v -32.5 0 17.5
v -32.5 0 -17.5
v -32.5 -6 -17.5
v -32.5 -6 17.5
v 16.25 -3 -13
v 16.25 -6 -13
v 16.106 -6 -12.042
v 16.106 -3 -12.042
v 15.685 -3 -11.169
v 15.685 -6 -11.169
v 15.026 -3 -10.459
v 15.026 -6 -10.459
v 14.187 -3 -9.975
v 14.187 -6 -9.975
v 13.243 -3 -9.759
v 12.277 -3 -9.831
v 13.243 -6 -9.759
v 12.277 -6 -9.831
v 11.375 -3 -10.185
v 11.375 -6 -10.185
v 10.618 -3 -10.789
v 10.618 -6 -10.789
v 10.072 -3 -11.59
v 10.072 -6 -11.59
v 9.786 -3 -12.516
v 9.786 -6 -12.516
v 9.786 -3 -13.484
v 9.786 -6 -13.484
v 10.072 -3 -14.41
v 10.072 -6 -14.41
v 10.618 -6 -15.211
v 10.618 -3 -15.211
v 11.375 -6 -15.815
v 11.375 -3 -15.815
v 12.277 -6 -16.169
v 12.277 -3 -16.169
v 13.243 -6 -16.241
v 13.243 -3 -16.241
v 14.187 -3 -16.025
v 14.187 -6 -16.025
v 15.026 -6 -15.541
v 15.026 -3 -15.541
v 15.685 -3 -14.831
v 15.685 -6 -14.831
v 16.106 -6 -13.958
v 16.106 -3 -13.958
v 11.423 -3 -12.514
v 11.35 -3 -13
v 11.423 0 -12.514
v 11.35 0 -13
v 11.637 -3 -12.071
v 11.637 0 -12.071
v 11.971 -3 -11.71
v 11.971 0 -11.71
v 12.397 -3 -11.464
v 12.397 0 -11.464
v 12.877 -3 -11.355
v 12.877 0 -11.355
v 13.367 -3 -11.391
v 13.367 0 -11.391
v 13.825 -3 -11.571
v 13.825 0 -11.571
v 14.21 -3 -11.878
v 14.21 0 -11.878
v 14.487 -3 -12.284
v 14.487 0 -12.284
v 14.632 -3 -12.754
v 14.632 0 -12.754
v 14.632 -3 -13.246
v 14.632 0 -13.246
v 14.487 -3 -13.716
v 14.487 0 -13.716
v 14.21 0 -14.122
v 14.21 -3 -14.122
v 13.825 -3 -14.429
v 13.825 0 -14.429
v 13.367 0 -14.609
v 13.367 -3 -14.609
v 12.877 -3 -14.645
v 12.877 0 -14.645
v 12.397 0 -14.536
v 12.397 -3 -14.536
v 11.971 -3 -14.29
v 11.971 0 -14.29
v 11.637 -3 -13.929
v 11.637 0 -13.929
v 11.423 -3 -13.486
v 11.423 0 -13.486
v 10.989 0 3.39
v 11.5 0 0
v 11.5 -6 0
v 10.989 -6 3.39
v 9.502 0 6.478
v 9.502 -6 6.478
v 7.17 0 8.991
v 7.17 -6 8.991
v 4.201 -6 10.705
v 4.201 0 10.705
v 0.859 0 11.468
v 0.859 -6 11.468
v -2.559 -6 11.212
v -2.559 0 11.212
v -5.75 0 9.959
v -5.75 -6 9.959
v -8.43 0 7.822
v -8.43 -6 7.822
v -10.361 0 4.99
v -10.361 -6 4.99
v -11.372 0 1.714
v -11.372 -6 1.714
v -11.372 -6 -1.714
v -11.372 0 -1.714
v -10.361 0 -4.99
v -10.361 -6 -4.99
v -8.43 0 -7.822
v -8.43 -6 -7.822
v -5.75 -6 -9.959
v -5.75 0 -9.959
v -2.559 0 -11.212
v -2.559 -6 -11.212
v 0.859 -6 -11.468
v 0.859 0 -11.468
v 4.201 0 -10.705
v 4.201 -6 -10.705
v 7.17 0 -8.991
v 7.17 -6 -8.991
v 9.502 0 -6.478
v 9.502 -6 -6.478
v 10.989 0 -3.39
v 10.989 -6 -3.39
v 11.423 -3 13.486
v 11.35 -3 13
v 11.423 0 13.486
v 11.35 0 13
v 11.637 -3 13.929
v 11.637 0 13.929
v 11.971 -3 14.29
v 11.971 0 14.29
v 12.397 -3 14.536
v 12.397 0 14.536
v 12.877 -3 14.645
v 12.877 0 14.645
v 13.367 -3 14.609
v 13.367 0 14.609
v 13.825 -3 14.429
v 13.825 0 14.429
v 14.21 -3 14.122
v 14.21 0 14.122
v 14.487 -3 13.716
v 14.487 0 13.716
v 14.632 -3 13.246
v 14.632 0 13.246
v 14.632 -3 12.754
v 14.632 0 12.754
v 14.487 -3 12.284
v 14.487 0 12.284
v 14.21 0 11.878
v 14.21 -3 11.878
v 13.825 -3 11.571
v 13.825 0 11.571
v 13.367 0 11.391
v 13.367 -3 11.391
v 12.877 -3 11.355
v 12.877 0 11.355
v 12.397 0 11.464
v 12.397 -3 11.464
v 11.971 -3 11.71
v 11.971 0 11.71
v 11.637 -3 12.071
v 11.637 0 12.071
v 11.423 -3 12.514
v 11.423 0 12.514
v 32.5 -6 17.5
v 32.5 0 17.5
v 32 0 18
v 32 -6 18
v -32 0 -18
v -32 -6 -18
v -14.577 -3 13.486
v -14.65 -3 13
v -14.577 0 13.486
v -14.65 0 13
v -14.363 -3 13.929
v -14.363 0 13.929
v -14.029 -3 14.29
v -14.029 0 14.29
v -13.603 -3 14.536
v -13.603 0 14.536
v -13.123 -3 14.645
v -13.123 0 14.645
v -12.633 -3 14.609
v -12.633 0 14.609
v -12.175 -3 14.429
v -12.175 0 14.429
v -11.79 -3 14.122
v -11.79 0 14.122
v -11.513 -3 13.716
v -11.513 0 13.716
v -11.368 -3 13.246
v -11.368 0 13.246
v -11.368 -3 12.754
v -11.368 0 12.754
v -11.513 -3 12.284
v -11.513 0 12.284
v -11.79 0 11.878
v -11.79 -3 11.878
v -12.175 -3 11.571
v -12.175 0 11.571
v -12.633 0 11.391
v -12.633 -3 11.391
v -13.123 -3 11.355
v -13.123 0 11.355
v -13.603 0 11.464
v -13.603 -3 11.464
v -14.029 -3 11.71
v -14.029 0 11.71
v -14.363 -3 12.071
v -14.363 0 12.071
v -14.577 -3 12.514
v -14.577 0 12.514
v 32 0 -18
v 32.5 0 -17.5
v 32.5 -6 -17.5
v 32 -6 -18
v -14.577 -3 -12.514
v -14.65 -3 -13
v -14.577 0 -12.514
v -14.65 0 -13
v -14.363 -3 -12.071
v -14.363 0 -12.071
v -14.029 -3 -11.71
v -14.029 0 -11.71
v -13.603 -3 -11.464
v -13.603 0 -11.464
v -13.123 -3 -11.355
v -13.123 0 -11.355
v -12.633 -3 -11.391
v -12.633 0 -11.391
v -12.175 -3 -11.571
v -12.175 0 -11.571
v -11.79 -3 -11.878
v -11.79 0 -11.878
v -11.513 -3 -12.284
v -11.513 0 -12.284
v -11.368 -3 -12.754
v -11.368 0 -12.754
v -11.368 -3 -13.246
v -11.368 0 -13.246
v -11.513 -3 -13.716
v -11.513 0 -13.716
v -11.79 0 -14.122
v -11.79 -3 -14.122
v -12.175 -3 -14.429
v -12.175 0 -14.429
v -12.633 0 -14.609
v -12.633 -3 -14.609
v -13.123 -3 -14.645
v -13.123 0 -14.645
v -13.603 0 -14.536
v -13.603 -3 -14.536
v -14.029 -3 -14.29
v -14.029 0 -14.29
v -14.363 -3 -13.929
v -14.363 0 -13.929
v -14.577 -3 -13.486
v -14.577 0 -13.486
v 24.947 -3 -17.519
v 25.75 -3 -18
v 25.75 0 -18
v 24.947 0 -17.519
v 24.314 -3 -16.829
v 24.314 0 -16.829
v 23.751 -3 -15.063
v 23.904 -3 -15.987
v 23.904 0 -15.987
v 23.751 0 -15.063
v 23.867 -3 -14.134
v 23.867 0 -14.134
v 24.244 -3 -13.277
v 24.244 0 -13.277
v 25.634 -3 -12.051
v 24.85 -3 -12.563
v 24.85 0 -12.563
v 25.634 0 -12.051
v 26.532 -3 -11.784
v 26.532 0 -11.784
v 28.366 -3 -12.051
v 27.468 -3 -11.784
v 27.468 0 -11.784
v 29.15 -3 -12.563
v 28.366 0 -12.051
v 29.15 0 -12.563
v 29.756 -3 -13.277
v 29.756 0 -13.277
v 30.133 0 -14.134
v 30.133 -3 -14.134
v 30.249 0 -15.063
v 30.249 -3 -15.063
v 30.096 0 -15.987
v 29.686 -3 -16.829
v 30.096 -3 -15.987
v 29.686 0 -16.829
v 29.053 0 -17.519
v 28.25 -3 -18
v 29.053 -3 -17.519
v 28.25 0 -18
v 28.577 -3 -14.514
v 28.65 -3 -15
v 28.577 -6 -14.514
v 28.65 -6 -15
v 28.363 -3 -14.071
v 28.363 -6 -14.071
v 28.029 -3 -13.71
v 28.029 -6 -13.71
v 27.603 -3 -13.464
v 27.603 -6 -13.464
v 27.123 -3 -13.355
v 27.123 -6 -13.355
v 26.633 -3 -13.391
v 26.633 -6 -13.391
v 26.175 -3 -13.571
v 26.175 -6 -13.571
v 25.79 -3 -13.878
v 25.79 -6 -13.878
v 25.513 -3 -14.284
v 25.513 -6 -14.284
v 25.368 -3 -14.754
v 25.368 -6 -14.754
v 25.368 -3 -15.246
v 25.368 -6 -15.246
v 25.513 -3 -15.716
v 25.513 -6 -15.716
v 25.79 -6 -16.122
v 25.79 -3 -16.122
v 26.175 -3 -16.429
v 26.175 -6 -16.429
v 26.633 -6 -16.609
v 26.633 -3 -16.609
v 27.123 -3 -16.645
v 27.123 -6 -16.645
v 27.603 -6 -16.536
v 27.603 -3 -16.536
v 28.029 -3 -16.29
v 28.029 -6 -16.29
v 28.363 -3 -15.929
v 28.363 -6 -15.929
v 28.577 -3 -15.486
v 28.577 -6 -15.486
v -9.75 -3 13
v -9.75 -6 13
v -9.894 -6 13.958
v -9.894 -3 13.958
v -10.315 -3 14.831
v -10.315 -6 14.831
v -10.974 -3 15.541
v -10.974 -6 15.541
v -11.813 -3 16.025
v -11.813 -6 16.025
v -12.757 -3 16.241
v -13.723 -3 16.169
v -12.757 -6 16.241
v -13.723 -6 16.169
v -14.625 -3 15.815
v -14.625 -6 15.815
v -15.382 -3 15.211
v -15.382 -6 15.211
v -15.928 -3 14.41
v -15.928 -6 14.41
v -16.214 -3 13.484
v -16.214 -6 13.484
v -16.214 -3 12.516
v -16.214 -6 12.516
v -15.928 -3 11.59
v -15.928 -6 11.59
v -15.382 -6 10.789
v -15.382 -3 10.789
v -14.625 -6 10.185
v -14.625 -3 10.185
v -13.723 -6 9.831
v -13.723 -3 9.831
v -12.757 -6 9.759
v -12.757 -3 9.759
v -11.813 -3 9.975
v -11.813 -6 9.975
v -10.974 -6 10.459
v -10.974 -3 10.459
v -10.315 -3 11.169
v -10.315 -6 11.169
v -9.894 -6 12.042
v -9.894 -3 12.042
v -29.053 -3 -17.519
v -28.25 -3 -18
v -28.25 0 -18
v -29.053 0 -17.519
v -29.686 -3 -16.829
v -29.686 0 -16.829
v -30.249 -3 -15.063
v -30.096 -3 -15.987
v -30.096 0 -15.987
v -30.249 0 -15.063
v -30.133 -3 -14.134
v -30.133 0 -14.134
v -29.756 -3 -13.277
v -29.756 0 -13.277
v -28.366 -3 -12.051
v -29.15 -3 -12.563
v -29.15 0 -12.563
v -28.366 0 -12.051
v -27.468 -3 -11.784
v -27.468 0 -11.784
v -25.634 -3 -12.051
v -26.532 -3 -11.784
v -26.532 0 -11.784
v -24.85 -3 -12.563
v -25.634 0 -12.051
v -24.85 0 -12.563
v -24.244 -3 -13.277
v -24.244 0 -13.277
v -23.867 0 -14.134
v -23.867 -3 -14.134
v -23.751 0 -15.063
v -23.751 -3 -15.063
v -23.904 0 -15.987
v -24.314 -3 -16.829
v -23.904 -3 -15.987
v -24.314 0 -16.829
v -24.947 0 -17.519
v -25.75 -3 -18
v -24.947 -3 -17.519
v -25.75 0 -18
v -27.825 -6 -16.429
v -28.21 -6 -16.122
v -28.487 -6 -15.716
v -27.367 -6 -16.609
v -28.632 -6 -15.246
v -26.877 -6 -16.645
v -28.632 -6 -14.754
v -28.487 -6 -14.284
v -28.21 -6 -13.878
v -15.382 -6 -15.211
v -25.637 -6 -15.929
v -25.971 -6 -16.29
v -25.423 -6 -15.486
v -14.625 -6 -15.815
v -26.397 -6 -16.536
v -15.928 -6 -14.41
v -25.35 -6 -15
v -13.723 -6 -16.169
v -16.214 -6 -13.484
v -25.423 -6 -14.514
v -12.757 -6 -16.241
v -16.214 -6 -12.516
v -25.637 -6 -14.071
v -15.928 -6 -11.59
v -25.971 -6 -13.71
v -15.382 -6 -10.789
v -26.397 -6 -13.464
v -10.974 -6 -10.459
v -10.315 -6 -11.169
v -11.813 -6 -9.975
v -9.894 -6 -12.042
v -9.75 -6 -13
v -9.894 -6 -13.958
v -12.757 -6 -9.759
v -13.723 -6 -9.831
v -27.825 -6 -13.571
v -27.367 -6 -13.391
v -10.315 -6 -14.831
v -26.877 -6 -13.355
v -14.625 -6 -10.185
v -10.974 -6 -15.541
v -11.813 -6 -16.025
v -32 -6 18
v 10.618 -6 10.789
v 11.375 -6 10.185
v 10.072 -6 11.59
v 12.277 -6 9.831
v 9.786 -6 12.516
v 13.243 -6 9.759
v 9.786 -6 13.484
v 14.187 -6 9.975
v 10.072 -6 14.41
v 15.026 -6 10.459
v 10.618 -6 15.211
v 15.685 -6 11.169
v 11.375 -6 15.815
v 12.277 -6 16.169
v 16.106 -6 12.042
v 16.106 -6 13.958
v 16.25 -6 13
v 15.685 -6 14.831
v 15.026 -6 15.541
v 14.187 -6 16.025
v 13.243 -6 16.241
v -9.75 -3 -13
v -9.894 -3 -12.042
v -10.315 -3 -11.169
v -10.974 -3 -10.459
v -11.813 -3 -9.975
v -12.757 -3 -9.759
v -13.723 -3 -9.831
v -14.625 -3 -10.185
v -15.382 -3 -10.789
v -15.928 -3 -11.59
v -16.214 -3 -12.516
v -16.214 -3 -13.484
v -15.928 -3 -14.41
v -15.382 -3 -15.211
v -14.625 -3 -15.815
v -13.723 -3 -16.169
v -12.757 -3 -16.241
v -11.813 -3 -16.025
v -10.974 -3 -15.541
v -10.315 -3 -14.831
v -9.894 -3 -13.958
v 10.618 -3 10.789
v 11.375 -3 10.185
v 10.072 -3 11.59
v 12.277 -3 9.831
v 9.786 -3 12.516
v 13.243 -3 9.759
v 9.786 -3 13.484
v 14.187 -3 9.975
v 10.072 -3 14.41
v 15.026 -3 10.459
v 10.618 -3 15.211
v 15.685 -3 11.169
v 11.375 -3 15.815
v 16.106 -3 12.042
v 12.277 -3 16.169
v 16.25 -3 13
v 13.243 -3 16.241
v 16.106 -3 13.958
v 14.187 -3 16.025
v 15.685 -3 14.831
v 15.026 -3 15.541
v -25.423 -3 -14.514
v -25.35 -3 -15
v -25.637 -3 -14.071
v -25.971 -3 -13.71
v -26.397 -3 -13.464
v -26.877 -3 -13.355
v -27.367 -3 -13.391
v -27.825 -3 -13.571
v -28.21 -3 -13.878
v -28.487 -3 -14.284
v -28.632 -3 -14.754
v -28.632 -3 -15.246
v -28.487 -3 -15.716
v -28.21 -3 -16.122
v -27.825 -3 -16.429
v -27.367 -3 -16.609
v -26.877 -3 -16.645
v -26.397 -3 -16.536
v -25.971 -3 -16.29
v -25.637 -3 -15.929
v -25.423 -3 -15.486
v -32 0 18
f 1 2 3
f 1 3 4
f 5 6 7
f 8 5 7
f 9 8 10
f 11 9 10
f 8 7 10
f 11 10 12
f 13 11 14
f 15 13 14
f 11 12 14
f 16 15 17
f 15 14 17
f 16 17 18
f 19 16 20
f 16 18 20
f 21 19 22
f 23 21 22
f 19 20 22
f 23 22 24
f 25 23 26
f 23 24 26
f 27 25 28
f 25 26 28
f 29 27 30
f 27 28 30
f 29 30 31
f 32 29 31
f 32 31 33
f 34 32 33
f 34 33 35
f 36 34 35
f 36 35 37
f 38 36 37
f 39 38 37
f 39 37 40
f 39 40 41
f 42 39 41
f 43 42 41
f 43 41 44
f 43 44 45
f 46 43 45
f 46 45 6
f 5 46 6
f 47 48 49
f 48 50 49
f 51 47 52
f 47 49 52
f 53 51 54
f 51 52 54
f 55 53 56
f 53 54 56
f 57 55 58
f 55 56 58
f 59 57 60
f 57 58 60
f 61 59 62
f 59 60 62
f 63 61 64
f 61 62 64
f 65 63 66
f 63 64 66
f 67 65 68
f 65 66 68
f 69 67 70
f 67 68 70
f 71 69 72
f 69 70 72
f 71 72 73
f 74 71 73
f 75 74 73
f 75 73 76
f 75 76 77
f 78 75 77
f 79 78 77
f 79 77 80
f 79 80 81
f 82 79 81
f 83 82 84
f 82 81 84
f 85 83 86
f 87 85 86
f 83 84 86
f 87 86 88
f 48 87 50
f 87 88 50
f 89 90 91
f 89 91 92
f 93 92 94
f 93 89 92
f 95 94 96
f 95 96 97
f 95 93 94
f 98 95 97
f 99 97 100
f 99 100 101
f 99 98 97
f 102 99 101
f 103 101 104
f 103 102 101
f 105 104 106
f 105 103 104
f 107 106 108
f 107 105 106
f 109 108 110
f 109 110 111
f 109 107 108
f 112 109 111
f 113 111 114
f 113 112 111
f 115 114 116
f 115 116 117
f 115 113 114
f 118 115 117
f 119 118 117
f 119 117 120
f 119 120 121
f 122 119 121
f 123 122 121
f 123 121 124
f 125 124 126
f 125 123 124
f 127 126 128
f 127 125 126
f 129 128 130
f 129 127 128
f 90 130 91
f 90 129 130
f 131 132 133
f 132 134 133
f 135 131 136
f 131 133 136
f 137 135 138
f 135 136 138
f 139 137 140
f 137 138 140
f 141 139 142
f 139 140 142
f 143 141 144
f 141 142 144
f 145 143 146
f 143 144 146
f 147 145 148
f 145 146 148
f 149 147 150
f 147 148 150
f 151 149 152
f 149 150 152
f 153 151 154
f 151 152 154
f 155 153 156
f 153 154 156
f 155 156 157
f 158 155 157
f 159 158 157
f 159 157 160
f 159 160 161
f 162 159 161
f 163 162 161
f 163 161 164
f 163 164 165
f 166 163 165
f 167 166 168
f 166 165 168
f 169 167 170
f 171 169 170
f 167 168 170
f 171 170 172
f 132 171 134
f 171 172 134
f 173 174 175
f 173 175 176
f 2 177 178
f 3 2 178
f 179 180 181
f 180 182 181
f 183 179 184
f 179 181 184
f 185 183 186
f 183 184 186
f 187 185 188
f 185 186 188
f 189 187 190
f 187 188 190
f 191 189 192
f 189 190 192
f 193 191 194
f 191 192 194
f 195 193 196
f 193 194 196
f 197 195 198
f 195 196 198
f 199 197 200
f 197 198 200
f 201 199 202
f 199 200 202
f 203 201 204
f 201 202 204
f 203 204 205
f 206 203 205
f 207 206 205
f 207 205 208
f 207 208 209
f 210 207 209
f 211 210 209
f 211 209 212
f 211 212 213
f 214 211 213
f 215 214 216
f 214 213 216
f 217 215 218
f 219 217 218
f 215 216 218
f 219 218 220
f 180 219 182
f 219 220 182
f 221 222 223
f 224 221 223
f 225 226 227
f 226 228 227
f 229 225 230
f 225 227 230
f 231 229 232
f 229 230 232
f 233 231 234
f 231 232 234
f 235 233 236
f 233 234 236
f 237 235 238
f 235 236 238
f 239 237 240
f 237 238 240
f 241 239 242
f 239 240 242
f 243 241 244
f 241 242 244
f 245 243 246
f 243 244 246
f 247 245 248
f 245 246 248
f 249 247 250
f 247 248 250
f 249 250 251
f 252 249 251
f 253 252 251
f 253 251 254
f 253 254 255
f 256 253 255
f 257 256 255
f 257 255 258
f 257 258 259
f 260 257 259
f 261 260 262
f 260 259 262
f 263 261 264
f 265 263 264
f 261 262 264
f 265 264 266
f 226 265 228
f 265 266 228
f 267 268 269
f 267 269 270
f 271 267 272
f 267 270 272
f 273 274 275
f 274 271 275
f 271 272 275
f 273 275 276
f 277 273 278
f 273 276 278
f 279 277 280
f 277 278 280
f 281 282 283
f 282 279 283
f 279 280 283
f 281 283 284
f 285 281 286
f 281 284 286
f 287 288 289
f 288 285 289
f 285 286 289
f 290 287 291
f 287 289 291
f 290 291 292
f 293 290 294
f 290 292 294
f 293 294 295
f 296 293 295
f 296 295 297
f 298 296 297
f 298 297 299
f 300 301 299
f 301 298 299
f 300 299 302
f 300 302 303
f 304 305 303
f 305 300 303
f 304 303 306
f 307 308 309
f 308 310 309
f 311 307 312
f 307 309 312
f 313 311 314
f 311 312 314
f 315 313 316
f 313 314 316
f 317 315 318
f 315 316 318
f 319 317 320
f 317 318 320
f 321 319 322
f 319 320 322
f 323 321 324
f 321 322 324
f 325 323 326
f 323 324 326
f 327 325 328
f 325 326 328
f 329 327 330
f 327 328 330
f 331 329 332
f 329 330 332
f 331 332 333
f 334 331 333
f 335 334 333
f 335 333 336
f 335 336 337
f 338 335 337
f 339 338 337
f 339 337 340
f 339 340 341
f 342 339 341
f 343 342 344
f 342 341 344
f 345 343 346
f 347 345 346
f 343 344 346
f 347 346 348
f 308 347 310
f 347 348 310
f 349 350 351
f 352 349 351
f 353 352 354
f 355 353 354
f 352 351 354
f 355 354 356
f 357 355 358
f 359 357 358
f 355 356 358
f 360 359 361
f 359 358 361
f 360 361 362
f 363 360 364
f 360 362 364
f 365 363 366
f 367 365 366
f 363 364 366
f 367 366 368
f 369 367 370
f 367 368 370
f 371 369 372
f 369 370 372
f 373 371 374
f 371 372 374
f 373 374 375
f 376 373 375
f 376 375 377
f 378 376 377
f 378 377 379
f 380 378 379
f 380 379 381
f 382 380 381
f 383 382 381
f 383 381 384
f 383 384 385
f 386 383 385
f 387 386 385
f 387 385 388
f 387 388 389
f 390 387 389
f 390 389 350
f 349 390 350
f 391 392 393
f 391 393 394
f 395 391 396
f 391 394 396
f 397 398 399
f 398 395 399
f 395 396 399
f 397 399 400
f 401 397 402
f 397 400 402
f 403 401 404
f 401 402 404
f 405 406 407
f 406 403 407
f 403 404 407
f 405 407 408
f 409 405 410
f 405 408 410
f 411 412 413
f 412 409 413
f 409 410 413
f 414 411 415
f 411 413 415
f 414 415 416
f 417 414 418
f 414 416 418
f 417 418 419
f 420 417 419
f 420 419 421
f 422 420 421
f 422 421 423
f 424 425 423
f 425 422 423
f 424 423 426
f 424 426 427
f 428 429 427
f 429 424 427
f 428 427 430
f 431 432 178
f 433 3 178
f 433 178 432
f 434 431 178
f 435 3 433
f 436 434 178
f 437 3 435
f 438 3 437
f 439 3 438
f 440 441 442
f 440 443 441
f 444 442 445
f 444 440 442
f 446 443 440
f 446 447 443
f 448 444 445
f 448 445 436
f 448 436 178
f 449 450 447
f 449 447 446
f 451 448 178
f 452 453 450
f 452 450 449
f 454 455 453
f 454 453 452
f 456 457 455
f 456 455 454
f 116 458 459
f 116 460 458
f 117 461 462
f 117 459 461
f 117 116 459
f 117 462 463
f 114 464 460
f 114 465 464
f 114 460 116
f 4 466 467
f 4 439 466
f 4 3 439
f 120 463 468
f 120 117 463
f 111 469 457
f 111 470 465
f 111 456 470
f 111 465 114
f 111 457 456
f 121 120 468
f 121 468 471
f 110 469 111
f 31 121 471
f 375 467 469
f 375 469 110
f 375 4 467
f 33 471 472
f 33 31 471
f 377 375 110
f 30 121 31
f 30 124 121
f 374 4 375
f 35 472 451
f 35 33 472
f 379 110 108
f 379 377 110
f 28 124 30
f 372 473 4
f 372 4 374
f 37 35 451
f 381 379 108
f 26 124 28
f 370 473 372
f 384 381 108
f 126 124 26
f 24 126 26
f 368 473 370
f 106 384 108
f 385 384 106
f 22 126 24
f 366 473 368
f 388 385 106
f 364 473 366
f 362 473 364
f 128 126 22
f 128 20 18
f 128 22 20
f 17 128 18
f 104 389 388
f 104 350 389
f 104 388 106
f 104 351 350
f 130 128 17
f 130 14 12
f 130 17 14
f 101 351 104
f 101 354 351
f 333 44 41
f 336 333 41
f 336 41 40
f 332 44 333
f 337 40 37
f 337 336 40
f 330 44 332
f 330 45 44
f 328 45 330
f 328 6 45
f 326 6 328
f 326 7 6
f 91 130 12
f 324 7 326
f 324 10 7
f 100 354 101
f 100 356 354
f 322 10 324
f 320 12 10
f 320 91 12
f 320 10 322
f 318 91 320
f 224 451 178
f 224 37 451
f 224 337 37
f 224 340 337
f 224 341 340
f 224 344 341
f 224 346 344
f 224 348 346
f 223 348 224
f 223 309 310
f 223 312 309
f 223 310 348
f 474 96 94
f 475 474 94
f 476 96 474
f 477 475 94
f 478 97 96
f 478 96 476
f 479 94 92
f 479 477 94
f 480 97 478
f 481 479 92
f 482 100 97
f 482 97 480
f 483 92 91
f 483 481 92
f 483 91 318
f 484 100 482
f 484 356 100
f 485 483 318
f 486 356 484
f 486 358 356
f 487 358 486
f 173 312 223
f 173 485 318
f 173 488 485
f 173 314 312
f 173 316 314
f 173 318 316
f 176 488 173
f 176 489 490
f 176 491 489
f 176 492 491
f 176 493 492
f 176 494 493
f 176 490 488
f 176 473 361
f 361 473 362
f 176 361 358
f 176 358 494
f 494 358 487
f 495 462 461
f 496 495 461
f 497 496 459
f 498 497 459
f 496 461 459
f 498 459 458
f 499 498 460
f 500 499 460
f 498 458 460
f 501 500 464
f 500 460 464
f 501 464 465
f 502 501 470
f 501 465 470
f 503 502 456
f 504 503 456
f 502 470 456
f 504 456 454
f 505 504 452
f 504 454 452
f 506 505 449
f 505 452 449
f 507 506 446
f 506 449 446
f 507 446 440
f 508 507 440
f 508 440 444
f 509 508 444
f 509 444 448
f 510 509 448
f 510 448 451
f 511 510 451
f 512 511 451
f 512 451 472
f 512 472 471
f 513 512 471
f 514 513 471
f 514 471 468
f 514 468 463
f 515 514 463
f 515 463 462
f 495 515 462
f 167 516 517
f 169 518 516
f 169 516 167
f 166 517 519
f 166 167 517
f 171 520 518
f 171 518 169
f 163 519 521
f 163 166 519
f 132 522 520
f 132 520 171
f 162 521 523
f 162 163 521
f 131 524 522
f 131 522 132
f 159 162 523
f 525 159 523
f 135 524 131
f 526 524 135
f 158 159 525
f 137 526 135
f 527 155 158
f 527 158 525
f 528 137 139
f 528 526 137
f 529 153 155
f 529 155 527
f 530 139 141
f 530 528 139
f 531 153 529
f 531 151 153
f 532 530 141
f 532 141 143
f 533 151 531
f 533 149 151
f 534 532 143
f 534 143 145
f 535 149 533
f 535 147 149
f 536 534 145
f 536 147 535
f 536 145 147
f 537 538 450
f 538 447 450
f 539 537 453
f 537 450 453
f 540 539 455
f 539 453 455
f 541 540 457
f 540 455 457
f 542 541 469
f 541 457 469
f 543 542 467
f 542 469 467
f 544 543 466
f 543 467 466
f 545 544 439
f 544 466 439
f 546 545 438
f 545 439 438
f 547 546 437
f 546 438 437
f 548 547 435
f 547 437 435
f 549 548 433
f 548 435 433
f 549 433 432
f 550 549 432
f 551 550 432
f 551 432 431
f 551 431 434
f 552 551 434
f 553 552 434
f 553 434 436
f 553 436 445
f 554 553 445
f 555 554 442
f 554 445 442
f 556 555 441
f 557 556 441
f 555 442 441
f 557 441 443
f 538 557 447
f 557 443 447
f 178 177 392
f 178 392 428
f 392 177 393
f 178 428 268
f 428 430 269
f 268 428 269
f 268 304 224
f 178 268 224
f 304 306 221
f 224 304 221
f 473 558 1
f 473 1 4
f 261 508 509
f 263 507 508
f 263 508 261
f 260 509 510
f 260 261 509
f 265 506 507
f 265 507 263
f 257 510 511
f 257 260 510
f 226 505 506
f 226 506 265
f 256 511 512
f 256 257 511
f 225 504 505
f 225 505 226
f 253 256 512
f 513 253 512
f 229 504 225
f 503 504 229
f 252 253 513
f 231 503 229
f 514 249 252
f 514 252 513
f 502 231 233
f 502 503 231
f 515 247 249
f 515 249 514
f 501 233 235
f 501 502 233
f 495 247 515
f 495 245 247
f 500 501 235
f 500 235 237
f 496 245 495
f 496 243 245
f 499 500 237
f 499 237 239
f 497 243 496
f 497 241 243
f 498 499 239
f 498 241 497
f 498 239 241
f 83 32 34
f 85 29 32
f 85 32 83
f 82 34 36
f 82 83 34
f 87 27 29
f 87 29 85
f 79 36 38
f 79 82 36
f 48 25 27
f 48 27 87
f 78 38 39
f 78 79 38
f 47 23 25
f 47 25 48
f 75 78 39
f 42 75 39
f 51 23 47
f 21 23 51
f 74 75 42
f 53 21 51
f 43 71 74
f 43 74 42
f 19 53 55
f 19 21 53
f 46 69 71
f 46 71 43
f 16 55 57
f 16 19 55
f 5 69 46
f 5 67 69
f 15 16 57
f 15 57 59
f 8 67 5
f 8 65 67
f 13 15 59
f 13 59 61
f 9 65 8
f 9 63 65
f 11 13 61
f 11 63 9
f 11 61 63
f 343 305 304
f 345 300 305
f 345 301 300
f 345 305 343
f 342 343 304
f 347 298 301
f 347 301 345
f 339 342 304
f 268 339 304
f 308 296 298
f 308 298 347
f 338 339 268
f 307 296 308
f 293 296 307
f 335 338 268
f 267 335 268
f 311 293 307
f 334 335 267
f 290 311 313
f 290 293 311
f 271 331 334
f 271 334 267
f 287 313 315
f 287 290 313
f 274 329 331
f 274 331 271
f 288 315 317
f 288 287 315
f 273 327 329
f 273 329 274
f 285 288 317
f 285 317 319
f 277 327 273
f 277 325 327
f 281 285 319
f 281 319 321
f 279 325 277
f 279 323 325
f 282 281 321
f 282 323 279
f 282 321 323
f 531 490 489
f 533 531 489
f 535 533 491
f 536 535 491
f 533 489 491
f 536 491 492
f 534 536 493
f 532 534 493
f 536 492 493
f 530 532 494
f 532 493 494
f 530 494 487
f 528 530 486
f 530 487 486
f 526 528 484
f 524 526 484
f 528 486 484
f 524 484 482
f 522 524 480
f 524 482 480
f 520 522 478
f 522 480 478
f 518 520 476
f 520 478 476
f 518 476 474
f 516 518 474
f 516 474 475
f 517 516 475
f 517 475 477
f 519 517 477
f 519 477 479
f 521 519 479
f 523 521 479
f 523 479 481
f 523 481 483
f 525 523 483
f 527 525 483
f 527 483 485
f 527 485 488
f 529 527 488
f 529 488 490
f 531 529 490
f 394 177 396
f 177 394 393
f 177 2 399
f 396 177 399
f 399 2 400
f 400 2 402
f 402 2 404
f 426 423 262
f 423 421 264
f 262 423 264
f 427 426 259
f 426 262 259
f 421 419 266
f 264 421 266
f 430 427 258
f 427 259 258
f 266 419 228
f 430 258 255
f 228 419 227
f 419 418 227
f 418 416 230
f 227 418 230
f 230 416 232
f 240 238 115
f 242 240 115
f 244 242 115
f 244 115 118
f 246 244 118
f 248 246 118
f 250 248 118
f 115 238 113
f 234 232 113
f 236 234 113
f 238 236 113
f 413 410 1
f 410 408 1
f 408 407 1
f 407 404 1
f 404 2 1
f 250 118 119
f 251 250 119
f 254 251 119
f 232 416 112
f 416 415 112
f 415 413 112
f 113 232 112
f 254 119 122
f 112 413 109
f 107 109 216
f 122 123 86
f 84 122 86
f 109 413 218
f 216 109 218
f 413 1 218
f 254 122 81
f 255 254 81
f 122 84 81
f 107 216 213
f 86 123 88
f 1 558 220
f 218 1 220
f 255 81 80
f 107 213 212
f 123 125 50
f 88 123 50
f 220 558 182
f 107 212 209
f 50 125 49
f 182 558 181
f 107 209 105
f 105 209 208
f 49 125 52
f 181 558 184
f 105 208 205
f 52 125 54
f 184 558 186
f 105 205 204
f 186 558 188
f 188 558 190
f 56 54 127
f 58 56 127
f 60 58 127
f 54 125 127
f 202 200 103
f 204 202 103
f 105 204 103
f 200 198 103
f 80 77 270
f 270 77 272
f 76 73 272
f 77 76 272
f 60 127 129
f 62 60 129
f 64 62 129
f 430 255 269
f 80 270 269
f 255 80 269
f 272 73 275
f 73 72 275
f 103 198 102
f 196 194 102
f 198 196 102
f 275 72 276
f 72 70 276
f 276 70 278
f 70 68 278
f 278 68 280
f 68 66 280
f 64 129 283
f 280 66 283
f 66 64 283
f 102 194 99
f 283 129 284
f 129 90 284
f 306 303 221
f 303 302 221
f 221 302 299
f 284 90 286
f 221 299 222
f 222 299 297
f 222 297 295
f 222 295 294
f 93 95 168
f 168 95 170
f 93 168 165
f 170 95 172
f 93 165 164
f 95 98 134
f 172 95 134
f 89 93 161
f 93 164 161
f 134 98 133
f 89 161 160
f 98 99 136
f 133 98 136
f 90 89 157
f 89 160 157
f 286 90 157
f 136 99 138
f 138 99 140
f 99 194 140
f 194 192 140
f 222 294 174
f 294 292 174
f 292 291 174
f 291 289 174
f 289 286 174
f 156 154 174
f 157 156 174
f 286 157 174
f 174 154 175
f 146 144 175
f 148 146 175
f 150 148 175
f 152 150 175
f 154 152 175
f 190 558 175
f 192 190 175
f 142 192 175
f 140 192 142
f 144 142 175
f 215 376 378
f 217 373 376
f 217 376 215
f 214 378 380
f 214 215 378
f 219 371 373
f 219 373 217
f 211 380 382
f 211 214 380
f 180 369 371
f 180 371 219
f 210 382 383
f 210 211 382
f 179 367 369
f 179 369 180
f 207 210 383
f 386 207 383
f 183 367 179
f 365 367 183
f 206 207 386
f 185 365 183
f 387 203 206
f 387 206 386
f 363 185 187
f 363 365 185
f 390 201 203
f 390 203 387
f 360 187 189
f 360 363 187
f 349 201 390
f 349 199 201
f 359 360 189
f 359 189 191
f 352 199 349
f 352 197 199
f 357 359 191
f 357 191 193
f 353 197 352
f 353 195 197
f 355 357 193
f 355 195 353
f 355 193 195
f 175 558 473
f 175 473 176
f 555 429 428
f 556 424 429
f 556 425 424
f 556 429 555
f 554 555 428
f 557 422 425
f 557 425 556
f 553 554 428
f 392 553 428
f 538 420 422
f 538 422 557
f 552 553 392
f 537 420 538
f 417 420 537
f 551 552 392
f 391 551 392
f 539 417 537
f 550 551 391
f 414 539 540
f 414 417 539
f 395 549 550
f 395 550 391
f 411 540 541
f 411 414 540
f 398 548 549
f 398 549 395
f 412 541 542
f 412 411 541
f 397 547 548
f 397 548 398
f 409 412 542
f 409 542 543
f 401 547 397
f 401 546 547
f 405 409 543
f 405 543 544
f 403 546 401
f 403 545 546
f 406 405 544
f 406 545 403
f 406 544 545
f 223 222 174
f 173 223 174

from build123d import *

# Parameters (mm, degrees)
F0_W           = 65
F0_H           = 36
F0_R           = 11.5
F1_DEPTH       = 6
F3_D           = 3.3
F3_CBORE_D     = 6.5
F3_CBORE_DEPTH = 3
F4_SIZE        = 0.5
F6_D           = 3.3
F6_CBORE_D     = 6.5
F6_CBORE_DEPTH = 3


with BuildPart() as f1:
    # F0 (on Front) → F1 (new body)
    with BuildSketch(Plane.XZ):
        Rectangle(F0_W, F0_H)
        Circle(F0_R, mode=Mode.SUBTRACT)
    extrude(amount=F1_DEPTH)

    # F3 (through all)
    with Locations(Plane.XZ.offset(6)):
        with Locations((13, 13), (13, -13), (-13, -13), (-13, 13)):
            CounterBoreHole(F3_D / 2, F3_CBORE_D / 2, F3_CBORE_DEPTH)

    # F4
    f4_edges = [f1.edges().sort_by_distance(p)[0] for p in [
        (-32.5, -3, 18),
        (32.5, -3, 18),
        (32.5, -3, -18),
        (-32.5, -3, -18),
    ]]
    chamfer(f4_edges, length=F4_SIZE)

    # F6 (through all)
    with Locations(Plane(origin=(0, 0, 0), x_dir=(-1, 0, 0), z_dir=(0, 1, 0))):
        with Locations((-27, -15), (27, -15)):
            CounterBoreHole(F6_D / 2, F6_CBORE_D / 2, F6_CBORE_DEPTH)


solid = f1.part
